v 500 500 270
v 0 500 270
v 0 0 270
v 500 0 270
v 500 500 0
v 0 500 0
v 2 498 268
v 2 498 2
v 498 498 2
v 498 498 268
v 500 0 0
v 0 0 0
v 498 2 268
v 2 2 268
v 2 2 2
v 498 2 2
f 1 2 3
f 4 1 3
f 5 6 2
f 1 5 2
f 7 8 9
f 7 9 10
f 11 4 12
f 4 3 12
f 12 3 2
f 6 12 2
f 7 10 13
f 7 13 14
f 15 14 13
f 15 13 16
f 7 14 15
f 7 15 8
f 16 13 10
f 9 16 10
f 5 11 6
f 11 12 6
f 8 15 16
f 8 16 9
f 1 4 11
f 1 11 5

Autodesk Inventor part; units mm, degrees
ref_plane "YZ Plane" through (0, 0, 0) normal (1, 0, 0) x (0, 1, 0)
ref_plane "XZ Plane" through (0, 0, 0) normal (0, 1, 0) x (-1, 0, 0)
ref_plane "XY Plane" through (0, 0, 0) normal (0, 0, 1) x (1, 0, 0)
sketch "Sketch1" plane through (0, 0, 0) normal (1, 0, 0) x (0, 1, 0)
  line L0 (0, 0) -> (500, 0)
  line L1 (500, 0) -> (500, 270)
  line L2 (500, 270) -> (0, 270)
  line L3 (0, 270) -> (0, 0)
  dimension "d0" = 500
  dimension "d1" = 270
extrude "Extrusion1" add sketch "Sketch1" along normal blind 500
shell "Shell1" thickness 2 removed faces 1 at (333.3333, 333.3333, 270)
sketch "Sketch2" plane through (0, 500, 270) normal (0, 1, 0) x (1, 0, 0)
  point P0 (0, 270)
sketch "Sketch3" plane through (2, 498, 2) normal (0, -1, 0) x (1, 0, 0)
  line L0 (0, 268) -> (496, 268) projected
  line L1 (496, 0) -> (496, 268) projected
  line L2 (0, 268) -> (496, 268)
  line L3 (496, 268) -> (496, 266)
  line L4 (496, 266) -> (0, 266)
  line L5 (0, 266) -> (0, 268)
  point P0 (-2, -2)
  dimension "d5" = 2
extrude "Extrusion2" add sketch "Sketch3" along normal blind 496
properties part number "Caja grande"
